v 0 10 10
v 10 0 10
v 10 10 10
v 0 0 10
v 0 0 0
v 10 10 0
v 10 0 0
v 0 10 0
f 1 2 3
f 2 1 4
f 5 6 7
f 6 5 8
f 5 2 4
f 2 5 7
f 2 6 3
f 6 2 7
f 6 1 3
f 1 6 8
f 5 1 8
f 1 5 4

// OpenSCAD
// Simple test cube for slicer comparison
// Compatible with MakerBot Customizer: https://customizer.makerbot.com/docs

// preview[view:south east, tilt:top diagonal]

/* [Dimensions] */
// Size of the cube in X direction
size_x = 10; // [5:1:50]

// Size of the cube in Y direction
size_y = 10; // [5:1:50]

// Size of the cube in Z direction
size_z = 10; // [5:1:50]

/* [Position] */
// Center the cube on the build plate
centered = false; // [true, false]

// Render the cube
cube([size_x, size_y, size_z], center=centered);
